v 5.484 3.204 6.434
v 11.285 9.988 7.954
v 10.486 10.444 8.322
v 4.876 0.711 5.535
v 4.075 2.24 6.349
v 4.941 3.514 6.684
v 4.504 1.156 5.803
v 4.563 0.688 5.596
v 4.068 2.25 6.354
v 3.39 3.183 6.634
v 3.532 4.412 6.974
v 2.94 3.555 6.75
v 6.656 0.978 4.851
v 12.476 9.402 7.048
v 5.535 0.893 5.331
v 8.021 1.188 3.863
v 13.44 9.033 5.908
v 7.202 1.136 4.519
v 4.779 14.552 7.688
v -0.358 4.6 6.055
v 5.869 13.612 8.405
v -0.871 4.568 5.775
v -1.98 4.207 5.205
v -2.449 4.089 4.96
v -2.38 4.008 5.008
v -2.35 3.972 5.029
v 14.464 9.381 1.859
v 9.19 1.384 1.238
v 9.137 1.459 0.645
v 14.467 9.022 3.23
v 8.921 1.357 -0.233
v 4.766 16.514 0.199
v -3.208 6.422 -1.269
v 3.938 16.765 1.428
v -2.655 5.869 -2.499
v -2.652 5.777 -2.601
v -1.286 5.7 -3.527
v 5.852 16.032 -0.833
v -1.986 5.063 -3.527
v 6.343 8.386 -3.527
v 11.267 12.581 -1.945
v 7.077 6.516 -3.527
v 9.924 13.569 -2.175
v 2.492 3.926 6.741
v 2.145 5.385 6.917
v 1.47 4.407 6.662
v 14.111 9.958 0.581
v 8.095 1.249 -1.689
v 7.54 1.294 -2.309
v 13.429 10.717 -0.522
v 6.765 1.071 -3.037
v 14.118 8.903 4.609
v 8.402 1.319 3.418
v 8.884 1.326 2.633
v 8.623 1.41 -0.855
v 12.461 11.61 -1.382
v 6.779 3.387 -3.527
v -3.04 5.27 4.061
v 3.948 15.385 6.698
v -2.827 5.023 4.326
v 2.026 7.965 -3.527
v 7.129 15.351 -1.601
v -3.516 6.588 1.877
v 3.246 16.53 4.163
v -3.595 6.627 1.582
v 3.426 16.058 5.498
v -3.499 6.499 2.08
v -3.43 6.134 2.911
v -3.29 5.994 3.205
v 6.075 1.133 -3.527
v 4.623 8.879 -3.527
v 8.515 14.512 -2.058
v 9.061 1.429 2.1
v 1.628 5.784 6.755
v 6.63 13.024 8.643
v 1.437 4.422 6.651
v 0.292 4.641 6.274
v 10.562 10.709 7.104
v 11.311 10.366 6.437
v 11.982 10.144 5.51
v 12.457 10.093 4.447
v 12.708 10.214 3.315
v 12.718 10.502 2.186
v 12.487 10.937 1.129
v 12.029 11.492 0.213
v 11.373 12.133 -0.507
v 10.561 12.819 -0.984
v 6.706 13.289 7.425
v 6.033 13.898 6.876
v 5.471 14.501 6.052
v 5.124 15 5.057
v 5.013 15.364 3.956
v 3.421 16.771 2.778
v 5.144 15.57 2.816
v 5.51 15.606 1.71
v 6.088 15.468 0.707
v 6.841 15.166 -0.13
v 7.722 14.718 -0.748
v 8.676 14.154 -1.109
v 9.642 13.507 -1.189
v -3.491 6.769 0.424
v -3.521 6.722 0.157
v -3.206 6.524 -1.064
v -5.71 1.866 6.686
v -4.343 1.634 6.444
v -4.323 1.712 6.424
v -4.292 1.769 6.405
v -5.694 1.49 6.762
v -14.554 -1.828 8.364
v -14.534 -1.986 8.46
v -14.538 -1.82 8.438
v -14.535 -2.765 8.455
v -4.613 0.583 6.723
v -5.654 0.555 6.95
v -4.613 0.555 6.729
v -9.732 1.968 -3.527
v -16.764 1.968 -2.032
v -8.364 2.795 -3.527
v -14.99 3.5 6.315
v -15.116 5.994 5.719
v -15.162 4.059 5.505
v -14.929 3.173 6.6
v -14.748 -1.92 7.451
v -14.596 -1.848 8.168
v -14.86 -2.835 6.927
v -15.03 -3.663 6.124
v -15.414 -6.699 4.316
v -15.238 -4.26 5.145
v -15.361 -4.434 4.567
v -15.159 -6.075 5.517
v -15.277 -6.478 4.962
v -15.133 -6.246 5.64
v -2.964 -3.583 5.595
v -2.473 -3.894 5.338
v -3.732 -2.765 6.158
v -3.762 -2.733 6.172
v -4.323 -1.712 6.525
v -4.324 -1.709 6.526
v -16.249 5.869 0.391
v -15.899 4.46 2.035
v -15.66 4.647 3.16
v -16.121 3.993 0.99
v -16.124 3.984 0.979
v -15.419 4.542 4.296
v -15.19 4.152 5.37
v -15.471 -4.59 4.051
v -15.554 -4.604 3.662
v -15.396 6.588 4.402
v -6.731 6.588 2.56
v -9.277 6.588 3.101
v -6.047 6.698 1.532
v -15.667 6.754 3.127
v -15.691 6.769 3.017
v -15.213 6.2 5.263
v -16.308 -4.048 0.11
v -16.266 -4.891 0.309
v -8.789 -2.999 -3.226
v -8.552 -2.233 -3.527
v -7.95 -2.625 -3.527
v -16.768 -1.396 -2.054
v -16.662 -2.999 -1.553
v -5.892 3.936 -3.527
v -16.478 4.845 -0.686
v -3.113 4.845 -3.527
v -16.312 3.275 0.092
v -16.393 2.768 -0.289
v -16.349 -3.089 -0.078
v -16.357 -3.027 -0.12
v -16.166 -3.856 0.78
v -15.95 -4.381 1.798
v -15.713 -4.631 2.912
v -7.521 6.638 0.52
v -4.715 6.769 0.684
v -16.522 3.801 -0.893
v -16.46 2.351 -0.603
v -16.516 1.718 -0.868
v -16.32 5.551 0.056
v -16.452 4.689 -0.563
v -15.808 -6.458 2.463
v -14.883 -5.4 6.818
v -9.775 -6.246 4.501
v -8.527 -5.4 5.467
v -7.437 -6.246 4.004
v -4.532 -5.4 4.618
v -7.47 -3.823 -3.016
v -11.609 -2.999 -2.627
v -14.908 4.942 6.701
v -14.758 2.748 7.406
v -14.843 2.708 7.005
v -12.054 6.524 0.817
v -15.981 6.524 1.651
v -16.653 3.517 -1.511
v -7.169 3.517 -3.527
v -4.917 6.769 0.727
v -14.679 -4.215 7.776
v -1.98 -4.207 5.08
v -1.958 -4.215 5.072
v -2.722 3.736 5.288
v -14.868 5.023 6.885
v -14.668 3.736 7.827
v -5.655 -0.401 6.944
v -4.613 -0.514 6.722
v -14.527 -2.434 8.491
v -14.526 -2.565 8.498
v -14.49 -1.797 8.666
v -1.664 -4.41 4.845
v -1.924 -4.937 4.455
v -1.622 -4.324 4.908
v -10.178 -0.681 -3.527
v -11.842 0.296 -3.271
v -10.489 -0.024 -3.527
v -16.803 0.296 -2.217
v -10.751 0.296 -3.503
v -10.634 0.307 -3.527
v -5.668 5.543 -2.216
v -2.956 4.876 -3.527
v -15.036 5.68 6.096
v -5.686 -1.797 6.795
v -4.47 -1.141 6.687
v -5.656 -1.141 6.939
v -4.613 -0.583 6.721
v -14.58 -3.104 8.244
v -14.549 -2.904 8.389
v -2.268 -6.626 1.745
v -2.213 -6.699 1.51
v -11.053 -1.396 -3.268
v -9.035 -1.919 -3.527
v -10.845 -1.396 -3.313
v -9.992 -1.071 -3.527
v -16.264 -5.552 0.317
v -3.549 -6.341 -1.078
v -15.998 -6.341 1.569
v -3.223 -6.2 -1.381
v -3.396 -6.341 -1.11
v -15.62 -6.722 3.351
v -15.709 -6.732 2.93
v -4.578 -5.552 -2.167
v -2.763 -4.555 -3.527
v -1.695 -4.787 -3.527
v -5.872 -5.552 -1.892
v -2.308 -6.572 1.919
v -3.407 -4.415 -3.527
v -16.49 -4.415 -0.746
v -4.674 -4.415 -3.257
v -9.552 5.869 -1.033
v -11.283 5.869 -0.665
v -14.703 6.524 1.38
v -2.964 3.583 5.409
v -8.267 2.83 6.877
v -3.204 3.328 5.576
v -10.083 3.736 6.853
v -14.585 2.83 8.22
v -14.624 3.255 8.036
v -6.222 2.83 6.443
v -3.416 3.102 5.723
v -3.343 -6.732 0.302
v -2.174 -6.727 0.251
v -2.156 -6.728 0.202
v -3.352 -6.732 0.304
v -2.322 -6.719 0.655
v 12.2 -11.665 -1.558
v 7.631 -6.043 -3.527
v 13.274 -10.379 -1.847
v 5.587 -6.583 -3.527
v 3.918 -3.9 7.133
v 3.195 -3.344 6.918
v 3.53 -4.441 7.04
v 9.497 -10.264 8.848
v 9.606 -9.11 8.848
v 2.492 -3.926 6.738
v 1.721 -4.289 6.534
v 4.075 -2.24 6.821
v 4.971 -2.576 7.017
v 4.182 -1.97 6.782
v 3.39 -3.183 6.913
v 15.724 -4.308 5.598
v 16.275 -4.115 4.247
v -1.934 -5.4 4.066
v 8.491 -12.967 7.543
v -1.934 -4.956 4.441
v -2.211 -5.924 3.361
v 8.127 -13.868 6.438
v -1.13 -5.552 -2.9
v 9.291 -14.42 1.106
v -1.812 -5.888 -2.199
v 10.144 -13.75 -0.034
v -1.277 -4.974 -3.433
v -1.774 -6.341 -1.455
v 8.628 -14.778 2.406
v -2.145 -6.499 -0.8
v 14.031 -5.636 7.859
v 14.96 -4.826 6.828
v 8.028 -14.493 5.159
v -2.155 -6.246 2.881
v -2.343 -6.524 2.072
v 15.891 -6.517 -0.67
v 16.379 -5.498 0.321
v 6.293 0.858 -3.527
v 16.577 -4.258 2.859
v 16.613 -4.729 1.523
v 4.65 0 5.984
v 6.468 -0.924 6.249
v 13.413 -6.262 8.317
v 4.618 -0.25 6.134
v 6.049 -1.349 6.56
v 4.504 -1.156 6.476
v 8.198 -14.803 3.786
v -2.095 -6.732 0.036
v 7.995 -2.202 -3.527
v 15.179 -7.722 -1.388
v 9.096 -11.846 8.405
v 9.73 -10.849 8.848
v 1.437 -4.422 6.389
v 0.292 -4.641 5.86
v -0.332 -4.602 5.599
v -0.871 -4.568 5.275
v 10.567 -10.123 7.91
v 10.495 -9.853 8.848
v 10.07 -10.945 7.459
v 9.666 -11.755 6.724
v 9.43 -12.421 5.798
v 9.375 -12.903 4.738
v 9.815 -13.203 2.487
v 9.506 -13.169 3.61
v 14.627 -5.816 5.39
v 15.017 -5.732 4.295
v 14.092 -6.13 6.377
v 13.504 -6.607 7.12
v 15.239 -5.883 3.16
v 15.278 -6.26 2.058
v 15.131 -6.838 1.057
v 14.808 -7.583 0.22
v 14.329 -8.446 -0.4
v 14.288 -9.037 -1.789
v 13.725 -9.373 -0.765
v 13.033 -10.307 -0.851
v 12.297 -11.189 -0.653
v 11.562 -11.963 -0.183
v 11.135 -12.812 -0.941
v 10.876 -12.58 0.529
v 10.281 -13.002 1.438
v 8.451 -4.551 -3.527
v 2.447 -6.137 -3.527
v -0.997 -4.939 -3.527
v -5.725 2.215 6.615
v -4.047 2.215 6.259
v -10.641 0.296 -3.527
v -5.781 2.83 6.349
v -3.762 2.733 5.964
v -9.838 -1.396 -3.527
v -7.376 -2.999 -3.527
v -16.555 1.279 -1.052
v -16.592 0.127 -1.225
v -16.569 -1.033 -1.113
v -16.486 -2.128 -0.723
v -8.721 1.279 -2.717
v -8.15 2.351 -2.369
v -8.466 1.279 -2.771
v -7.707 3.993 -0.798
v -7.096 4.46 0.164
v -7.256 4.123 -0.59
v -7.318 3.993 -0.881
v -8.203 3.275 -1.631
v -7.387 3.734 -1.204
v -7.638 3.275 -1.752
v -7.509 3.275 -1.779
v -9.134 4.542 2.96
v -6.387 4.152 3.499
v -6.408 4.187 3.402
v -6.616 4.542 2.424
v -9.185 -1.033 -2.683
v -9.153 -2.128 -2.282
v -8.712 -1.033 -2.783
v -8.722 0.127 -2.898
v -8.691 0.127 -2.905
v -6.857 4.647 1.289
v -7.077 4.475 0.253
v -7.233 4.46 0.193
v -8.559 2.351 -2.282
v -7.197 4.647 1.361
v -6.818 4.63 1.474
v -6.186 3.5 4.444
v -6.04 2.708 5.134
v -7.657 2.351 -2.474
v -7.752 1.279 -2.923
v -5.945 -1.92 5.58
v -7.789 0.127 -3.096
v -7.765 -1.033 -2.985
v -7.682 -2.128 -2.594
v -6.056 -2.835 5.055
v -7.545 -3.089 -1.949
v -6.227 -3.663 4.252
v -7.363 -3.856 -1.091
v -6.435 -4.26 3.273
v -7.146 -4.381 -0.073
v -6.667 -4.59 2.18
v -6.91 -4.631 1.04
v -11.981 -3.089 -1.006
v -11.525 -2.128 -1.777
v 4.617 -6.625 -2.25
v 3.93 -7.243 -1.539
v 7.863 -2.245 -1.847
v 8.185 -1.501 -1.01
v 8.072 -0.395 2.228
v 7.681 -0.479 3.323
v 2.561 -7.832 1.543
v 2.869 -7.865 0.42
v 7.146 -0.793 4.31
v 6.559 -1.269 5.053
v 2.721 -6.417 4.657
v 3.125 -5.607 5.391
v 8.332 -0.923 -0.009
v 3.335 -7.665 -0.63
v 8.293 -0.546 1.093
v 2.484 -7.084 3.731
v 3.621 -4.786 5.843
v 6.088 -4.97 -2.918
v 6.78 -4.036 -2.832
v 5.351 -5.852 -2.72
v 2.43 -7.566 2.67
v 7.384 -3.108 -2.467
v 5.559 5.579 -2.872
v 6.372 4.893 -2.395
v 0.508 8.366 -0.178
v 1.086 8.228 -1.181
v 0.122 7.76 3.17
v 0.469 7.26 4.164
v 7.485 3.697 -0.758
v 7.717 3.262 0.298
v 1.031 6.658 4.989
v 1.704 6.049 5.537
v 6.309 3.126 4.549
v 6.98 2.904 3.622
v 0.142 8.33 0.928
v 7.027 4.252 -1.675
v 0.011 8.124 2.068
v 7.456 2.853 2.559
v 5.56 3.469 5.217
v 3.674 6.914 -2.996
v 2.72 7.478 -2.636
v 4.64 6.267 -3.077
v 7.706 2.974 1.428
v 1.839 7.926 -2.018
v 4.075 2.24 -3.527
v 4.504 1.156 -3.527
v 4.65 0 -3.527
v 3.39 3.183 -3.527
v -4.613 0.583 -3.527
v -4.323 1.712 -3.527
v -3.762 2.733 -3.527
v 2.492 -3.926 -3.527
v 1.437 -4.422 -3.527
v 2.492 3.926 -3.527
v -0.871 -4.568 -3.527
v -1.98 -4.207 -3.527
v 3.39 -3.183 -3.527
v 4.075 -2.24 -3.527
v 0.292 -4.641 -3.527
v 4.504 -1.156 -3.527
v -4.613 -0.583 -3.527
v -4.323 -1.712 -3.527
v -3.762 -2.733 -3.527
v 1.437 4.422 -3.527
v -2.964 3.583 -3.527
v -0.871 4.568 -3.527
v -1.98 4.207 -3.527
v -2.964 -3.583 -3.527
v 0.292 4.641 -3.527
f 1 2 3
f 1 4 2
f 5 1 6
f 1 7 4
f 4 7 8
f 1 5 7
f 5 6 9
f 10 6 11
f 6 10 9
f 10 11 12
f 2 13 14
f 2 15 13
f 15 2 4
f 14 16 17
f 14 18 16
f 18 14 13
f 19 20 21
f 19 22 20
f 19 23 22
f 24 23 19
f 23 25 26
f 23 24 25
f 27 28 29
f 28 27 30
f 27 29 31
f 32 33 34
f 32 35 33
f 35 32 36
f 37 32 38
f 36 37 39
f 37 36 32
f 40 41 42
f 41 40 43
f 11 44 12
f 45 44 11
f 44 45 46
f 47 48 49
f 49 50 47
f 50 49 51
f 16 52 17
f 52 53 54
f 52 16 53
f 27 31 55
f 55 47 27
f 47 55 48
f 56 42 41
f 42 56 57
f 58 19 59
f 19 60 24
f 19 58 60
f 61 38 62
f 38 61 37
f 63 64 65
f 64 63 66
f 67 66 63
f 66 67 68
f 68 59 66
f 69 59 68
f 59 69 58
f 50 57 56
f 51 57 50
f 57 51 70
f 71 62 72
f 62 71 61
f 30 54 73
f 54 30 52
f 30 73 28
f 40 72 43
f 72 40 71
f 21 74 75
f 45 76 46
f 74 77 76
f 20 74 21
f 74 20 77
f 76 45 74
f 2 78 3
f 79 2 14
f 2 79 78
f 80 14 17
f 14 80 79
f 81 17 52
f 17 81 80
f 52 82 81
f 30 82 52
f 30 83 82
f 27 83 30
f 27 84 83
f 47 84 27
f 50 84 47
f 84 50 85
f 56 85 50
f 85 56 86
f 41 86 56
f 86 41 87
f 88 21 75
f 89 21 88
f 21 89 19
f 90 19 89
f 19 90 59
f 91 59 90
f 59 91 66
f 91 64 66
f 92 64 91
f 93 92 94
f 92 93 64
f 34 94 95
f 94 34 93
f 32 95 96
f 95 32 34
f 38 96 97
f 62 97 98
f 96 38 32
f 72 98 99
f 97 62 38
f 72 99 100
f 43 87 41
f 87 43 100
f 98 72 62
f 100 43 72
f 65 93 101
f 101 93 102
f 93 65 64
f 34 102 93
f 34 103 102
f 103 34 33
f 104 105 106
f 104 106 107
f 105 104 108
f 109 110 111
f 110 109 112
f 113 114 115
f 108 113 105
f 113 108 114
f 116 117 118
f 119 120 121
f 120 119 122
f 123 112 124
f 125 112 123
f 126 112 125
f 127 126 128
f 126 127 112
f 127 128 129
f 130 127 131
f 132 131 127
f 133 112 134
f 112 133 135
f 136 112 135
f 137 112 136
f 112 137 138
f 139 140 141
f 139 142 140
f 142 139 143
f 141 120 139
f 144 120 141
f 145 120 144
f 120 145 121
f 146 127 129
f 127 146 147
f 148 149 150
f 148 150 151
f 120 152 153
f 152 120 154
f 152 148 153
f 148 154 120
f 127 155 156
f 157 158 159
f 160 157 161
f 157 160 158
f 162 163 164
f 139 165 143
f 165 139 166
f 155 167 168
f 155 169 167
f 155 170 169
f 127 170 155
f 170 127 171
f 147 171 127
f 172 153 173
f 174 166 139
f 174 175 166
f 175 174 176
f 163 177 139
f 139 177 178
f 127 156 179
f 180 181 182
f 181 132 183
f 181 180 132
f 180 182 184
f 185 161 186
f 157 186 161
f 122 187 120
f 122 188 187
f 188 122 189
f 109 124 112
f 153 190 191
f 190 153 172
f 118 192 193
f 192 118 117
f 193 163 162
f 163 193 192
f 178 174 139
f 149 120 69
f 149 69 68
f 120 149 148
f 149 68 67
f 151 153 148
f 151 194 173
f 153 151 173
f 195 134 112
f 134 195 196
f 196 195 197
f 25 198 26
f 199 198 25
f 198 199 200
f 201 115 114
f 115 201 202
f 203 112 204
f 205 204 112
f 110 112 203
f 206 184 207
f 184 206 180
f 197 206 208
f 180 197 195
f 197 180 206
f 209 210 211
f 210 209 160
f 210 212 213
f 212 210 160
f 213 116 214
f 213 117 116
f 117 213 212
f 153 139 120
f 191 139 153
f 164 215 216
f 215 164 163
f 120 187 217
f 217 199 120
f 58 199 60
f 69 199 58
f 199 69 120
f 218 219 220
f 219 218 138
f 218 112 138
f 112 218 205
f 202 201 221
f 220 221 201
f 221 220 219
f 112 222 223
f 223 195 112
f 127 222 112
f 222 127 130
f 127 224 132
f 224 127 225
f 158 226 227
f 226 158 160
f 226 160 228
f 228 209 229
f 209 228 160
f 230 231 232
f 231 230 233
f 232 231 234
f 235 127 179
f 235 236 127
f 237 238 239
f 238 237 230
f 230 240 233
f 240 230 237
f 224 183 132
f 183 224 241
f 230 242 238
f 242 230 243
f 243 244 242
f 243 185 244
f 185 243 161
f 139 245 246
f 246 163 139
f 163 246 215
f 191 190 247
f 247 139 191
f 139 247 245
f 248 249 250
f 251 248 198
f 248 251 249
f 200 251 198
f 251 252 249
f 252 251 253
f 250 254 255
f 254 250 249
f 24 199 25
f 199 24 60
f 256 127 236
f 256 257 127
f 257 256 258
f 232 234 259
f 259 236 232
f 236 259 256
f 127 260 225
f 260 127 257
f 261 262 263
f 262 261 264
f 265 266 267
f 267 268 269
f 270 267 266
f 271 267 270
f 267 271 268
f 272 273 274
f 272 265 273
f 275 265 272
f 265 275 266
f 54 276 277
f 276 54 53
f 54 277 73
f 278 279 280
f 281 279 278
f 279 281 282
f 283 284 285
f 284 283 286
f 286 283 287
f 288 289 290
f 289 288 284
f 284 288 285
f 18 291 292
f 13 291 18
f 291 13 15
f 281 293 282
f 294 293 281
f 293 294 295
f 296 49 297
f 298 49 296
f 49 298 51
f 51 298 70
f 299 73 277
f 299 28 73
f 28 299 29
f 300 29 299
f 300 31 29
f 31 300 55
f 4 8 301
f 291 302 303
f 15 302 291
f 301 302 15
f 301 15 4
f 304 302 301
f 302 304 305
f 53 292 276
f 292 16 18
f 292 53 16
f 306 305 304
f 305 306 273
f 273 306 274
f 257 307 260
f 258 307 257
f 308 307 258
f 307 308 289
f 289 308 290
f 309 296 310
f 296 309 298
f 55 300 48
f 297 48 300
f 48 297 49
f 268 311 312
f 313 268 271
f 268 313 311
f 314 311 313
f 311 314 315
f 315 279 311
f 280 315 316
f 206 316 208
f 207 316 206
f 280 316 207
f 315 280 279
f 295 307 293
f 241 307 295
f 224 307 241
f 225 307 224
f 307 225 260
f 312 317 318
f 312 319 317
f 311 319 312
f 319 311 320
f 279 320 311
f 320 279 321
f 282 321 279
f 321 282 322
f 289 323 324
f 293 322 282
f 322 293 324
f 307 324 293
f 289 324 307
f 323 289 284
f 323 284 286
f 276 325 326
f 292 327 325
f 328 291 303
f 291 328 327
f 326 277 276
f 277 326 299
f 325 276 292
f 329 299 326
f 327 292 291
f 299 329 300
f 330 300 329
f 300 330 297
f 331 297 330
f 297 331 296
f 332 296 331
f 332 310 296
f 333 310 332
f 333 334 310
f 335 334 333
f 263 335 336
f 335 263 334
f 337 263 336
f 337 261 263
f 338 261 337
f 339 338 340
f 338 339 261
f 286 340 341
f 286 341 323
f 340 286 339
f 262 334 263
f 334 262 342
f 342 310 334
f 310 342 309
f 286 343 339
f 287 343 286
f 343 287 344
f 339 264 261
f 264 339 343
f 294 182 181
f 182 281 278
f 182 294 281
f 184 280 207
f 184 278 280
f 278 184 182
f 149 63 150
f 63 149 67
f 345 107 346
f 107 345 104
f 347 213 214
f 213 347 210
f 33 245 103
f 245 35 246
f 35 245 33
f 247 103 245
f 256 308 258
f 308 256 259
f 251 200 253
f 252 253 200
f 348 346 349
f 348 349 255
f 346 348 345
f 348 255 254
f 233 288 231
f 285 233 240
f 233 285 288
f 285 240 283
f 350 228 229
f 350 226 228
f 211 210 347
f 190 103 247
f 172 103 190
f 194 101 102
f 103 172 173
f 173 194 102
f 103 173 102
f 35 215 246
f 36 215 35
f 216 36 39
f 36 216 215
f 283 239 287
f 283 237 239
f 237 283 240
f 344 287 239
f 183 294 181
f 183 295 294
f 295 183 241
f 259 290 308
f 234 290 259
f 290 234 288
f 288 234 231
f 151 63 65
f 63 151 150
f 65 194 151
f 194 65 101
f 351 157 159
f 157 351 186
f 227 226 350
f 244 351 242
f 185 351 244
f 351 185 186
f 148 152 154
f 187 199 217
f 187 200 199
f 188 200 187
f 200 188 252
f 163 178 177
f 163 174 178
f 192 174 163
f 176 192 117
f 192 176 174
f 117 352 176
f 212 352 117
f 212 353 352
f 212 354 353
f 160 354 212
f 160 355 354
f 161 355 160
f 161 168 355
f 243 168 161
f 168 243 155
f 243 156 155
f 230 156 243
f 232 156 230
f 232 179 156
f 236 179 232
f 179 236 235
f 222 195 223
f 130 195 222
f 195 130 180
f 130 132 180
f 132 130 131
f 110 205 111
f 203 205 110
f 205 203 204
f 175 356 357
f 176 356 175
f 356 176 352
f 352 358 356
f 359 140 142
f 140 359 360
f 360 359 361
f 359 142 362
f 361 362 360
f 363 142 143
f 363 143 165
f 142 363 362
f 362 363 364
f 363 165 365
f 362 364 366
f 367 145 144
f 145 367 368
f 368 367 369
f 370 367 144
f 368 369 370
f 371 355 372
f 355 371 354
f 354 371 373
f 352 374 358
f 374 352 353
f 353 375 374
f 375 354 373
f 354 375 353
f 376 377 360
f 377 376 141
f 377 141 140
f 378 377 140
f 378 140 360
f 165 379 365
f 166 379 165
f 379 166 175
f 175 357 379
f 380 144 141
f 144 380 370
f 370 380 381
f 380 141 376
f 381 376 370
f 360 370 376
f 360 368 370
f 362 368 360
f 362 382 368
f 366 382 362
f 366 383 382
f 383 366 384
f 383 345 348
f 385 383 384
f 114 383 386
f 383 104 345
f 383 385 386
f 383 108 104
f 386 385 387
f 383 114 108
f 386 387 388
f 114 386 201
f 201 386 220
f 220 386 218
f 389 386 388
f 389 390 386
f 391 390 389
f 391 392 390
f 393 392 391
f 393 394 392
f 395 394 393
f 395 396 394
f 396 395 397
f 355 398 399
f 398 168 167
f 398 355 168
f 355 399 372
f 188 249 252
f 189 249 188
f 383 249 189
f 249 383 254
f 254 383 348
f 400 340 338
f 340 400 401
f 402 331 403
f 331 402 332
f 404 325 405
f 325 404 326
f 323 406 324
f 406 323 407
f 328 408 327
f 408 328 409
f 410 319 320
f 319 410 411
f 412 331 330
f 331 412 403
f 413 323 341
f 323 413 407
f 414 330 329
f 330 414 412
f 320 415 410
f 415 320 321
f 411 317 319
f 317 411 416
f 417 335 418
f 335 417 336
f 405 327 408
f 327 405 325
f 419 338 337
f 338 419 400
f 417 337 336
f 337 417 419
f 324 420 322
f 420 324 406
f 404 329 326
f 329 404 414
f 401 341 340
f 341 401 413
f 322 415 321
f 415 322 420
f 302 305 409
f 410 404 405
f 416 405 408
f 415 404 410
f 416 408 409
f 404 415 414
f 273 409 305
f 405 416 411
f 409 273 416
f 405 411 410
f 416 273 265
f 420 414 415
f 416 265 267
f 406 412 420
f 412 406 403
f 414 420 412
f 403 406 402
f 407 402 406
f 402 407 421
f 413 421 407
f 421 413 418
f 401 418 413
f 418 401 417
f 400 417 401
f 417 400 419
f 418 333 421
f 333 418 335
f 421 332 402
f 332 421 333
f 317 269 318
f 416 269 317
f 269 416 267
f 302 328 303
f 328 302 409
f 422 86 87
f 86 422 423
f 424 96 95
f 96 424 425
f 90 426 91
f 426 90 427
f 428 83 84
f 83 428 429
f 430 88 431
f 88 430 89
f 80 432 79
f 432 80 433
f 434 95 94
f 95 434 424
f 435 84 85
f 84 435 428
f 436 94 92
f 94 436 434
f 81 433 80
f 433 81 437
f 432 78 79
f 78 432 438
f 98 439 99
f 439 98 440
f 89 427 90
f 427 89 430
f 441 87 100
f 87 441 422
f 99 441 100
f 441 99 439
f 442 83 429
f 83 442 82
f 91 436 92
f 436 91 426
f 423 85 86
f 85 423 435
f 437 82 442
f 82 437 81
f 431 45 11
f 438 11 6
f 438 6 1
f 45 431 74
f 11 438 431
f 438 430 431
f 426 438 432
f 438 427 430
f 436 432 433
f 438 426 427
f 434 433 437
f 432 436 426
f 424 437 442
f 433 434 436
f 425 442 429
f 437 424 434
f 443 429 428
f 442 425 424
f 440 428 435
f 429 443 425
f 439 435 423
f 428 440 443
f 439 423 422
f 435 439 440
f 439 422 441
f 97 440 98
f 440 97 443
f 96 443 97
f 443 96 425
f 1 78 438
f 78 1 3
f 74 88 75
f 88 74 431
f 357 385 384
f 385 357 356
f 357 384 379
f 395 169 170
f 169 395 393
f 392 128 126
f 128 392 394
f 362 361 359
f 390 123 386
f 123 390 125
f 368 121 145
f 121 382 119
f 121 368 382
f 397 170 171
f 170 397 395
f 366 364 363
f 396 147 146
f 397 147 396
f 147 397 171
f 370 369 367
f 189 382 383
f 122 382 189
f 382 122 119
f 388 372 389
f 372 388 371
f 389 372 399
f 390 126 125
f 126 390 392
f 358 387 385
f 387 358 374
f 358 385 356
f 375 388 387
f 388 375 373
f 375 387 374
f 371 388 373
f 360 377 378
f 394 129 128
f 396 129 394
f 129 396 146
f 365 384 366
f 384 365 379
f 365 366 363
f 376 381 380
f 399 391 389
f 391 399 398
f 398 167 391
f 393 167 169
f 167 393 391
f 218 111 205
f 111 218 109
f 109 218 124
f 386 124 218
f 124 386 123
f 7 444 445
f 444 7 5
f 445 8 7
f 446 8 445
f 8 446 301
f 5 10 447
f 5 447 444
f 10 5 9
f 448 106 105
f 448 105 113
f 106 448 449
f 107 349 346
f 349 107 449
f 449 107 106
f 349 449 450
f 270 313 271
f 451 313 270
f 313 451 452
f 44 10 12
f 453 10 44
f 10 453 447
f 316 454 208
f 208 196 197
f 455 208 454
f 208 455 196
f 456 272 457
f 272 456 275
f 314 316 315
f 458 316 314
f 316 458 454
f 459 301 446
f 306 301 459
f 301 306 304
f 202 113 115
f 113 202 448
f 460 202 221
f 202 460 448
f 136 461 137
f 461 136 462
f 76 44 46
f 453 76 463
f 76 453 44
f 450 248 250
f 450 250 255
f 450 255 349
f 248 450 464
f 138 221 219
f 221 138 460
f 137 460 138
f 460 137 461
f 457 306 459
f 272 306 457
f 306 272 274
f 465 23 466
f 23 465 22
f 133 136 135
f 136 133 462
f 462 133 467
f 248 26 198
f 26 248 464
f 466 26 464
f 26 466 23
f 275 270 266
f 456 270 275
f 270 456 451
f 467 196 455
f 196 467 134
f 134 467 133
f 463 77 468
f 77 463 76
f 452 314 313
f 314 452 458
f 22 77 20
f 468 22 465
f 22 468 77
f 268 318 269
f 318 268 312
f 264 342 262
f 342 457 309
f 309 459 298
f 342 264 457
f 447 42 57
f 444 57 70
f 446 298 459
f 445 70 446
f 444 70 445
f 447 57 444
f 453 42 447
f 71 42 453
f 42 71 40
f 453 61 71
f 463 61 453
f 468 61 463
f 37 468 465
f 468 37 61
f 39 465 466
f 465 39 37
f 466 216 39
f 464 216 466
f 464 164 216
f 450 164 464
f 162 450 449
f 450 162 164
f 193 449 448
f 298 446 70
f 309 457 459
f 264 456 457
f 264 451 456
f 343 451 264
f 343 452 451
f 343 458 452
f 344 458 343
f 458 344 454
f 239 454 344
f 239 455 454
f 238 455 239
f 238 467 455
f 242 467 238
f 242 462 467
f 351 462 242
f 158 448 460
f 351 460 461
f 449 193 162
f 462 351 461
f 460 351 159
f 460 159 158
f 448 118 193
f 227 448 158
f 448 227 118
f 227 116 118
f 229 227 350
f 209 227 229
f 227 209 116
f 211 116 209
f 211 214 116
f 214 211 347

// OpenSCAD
// LICENSE: CC Attribution 4.0 International
// Construct vertices for archimedean solids
// Heavily inspired by a similar project for platonic solids: https://www.prusaprinters.org/prints/78213-platonic-solid-vertices/files


// Some parameters might need some ad-hoc manual tweaking (the geometry is pretty hard and annoying to do thouroughly)


length = 9;
diameter = 9.3;

radius = diameter/2;
thickness = 1;
center_offset=1.5*radius;
$fn = 25; // cylinder hole precision

pentagon_angle = 108;
hexagon_angle = 120;
octagon_angle = 135;
decagon_angle = 144;

// Snub cube
//angle_3_3 = 153.23;
//angle_3_4 = 142.98;
//draw_vertex(68,24,[[90,angle_3_4],[60,angle_3_4],[60,angle_3_3],[60,angle_3_3],[60,angle_3_3]]);

// Snub dodecahedron
//angle_3_3 = 164.18;
//angle_3_5 = 152.93;
//draw_vertex(77,18,[[pentagon_angle,angle_3_5],[60,angle_3_5],[60,angle_3_3],[60,angle_3_3],[60,angle_3_3]]);

// Cube
//draw_vertex(52,45,[[90,90],[90,90],[90,90]]);



// Icosahedron
//angle = acos(-sqrt(5)/3);
//draw_vertex(60,21,[[60,angle],[60,angle],[60,angle],[60,angle],[60,angle]]);

// Dodecaedron
//angle = acos(-1/sqrt(5));
//draw_vertex(68,31,[[pentagon_angle,angle],[pentagon_angle,angle],[pentagon_angle,angle]]);


// Tetraedron
//angle = acos(1/3);
//draw_vertex(38,45,[[60,angle],[60,angle],[60,angle]]);

// Rhombicuboctahedron
//draw_vertex(67.5,22.5,[[90,144.74],[90,135],[90,135],[60,144.74]]);

// Rhombicosidodecahedron
//angle_4_5 = 148.28;
//angle_3_4 = 159.09;
//draw_vertex(77,19,[[108,angle_4_5],[90,angle_4_5],[60,angle_3_4],[90,angle_3_4]]);

// Truncated cuboctahedron
angle_4_6 = acos(-sqrt(6)/3);
angle_4_8 = acos(-1/sqrt(2));
angle_6_8 = acos(-sqrt(3)/3);
// first half
draw_vertex(78,33,[[octagon_angle,angle_6_8],[90,angle_4_8],[hexagon_angle,angle_4_6]]);
// second half
//draw_vertex(78,22,[[hexagon_angle,angle_6_8],[90,angle_4_6],[octagon_angle,angle_4_8]]);



// Truncated icosahedron
//draw_vertex(79,21,[[120,142.62],[120,138.189685],[108,142.62]]);
    

// Icosidodecahedron
//angle = 142.62;
//draw_vertex(72,25,[[108,angle],[60,angle], [108,angle], [108,angle]]);


// Truncated dodecahedron
//angle_10_10 = 116.57;
//angle_3_10 = 142.62;
//draw_vertex(80,30,[[decagon_angle,angle_3_10],[decagon_angle,angle_10_10], [60,angle_3_10]]);

// Cuboctahedron
//angle = 125.26;
//draw_vertex(60,35,[[90,angle],[60,angle], [90,angle], [60,angle]]);

//Truncated octahedron
//angle_46 = acos(-1/sqrt(3));
//angle_66 = acos(-1/3);
//draw_vertex(73,36,[[120,angle_46],[120,angle_66], [90,angle_46]]);

////////////////////////////////////////////////////////////////////////

module hole()
{
    ext_radius = radius + thickness;
    translate([0,0,center_offset])
        cylinder(h = length+20, r = radius);
    translate([radius/2,-radius/2,center_offset])
        cube([length,radius,length+center_offset], center=false);
}

module support()
{
    ext_radius = radius + thickness;
//    translate([0,0,-2])
//            cylinder(h = length, r = ext_radius);
//        translate([-ext_radius,-1.5*ext_radius,-2])
//            cube([2*ext_radius,3*ext_radius,length], center=false);   
    
    scale([1,1.2,1])cylinder(h = length+center_offset, r = ext_radius);
//    translate([radius,-radius,0])
//        cube([length,2*radius,length+center_offset], center=false);

}

MODE_HOLE=1;
MODE_SUPPORT=2;

module construct(mode)
{
    if(mode == MODE_HOLE)
    {
        hole();
    }else if(mode == MODE_SUPPORT)
    {
        support();
    }
}

module process_list_3(mode,list)
{
rotate([0,0,-(180-list[0][1])/2]) 
    construct(mode);
rotate ([list[0][0],0,0]) 
{
rotate ([0,0,(180-list[1][1])/2]) construct(mode);
rotate ([0,0,180-list[1][1]]) rotate ([list[1][0],0,0]) 
{
rotate ([0,0,(180-list[2][1])/2]) 
    construct(mode);
    
rotate ([0,0,180-list[2][1]]) rotate ([list[2][0],0,0]) 
{
rotate ([0,0,(180-list[0][1])/2]) 
    construct(mode);
}
}
}
}

module process_list_4(mode,list)
{
rotate([0,0,-(180-list[0][1])/2]) 
    construct(mode);
rotate ([list[0][0],0,0]) 
{
rotate ([0,0,(180-list[1][1])/2]) construct(mode);
rotate ([0,0,180-list[1][1]]) rotate ([list[1][0],0,0]) 
{
rotate ([0,0,(180-list[2][1])/2]) 
    construct(mode);

rotate ([0,0,180-list[2][1]]) rotate ([list[2][0],0,0]) 
{
    rotate ([0,0,(180-list[3][1])/2])
    construct(mode);
}
}
}
}

module process_list_5(mode,list)
{
rotate([0,0,-(180-list[0][1])/2]) 
    construct(mode);
rotate ([list[0][0],0,0]) 
{
rotate ([0,0,(180-list[1][1])/2]) construct(mode);
rotate ([0,0,180-list[1][1]]) rotate ([list[1][0],0,0]) 
{
rotate ([0,0,(180-list[2][1])/2]) 
    construct(mode);

rotate ([0,0,180-list[2][1]]) rotate ([list[2][0],0,0]) 
{
    rotate ([0,0,(180-list[3][1])/2])
    construct(mode);
    rotate ([0,0,180-list[3][1]]) rotate ([list[3][0],0,0]) 
{
    rotate ([0,0,(180-list[4][1])/2])
    construct(mode);
}
}
}
}
}

module process_supports(list)
{
    if(len(list) == 3) {
            process_list_3(MODE_SUPPORT,list);
    }else if(len(list) == 4) {
            process_list_4(MODE_SUPPORT,list);
    }else if(len(list) == 5) {
            process_list_5(MODE_SUPPORT,list);
    }
}
module process_holes(list)
{
    if(len(list) == 3) {
            process_list_3(MODE_HOLE,list);
    }else if(len(list) == 4) {
            process_list_4(MODE_HOLE,list);
    }else if(len(list) == 5) {
            process_list_5(MODE_HOLE,list);
    }
}

module center_cylinder()
{
    size = 1.5*length;
//    translate([-size/2,-size/2,-radius-thickness])
//     cube([size,size,length],center=false);
//    cylinder(h = 100, r = 2);
}

module center_hole()
{
    cylinder(h = 4*length, r = radius, center=true);

}


module draw_vertex(base_y_rot,base_z_rot,list)
{
    last_dihedral = list[len(list)][1];
    intersection(){
    difference(){
                rotate([0,-base_y_rot,0]) rotate([0,0,base_z_rot]) 
        difference(){
            union(){
                rotate([0,0,-base_z_rot]) rotate([0,base_y_rot,0]) %center_cylinder();
                process_supports(list);
                }
            process_holes(list);
        }
    center_hole();
        }
        z_offset = (radius+thickness)*sin(base_y_rot)-2;
        max_x = (radius+thickness)*sin(base_y_rot) + (length+center_offset)*cos(base_y_rot);
        translate([-2*length,-2*length,-z_offset])
        #cube([4*length,4*length,max_x+z_offset]);
    }
}
